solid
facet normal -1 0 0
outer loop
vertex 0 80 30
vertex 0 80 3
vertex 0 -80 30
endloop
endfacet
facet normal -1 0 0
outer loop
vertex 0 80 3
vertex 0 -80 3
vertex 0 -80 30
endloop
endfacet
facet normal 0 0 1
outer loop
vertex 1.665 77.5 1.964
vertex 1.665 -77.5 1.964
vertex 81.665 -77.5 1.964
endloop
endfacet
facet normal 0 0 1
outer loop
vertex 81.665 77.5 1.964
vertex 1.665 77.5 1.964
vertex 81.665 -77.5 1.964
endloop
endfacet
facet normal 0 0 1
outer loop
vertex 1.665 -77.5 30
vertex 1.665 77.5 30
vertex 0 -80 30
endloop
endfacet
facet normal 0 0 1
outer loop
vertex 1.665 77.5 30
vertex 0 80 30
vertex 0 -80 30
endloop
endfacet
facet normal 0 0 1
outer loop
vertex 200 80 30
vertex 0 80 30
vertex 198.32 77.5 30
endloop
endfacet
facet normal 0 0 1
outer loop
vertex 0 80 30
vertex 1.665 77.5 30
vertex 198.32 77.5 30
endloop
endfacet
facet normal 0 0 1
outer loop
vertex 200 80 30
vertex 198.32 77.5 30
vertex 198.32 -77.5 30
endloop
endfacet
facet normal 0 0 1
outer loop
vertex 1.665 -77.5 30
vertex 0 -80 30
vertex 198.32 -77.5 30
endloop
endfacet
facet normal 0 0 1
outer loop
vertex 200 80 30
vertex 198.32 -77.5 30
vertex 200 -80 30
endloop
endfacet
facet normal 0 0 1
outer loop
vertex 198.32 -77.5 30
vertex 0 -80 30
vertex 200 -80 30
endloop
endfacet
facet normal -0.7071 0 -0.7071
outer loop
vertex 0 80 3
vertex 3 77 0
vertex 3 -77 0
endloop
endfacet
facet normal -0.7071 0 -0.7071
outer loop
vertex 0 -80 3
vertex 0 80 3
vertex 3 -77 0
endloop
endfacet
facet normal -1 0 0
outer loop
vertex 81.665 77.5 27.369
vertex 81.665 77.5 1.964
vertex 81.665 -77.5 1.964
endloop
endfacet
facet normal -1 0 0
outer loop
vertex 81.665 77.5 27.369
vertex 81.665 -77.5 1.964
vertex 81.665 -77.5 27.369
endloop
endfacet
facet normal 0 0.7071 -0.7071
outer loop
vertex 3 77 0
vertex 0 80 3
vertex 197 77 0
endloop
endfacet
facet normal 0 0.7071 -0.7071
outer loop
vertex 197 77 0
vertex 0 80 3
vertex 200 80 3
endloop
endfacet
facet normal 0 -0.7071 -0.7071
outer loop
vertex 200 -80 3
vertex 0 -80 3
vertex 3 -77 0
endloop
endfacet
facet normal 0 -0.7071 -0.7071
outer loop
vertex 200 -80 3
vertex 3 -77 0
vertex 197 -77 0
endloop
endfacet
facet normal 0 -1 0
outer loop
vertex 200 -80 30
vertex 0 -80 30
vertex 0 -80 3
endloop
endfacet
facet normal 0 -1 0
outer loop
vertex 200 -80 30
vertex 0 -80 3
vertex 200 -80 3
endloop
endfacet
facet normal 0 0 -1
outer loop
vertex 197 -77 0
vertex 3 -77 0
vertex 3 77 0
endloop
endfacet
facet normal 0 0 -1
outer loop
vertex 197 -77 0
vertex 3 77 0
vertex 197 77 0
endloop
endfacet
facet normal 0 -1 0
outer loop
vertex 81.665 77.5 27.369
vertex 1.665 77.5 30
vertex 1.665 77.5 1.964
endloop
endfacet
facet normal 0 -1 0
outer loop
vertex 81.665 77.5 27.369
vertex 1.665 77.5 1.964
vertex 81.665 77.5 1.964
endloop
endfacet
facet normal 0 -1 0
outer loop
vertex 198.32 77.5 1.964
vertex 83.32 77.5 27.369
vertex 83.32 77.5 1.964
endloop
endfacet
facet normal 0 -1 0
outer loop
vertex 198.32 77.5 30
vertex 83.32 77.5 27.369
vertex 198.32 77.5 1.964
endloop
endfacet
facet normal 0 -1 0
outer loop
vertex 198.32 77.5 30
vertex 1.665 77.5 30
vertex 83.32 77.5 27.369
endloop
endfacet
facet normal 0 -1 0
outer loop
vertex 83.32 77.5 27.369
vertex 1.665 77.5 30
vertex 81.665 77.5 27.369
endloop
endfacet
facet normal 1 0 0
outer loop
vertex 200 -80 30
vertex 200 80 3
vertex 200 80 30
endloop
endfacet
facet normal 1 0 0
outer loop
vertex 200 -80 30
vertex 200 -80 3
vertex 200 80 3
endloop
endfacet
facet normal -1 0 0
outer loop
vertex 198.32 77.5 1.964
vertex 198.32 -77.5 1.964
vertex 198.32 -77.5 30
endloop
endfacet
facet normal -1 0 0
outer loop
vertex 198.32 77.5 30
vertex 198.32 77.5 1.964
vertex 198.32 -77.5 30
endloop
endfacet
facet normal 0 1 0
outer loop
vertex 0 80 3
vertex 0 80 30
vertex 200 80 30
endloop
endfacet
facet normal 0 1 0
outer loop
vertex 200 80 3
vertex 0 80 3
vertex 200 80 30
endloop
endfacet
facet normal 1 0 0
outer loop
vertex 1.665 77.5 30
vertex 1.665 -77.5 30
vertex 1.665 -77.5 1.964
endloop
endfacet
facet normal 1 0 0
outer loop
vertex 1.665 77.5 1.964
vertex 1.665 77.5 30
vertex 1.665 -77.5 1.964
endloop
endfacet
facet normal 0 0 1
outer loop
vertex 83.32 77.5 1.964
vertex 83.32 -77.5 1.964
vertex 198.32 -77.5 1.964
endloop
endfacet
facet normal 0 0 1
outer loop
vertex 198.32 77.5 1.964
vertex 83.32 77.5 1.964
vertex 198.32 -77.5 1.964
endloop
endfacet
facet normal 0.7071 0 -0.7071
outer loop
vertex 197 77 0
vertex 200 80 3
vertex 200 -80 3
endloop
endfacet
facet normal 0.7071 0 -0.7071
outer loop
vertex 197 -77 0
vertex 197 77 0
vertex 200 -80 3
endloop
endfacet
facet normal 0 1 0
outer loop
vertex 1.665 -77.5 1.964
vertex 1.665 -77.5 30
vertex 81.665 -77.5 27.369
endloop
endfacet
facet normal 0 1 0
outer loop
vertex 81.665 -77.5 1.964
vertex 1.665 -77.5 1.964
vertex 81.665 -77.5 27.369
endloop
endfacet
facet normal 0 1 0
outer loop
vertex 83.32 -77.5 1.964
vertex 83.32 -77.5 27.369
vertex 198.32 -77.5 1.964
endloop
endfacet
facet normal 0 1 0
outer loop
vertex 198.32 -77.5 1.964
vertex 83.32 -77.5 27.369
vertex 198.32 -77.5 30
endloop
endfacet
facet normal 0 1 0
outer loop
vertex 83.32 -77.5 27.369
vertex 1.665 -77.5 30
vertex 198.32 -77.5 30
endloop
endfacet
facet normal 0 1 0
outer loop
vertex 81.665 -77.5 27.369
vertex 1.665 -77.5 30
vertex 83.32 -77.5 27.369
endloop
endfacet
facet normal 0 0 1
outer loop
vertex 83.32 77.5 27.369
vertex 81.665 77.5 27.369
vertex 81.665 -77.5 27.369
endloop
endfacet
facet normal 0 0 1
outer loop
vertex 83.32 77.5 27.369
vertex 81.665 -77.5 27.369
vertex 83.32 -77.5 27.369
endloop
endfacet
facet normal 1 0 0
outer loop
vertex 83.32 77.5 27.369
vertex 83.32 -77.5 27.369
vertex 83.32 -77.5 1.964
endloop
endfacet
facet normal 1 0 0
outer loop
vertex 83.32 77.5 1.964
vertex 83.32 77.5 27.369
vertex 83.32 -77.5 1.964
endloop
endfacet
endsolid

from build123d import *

# Parameters (mm, degrees)
F0_W     = 200
F0_H     = 30
F1_DEPTH = 80
F2_W     = 0.6549034361
F2_H     = 3.5952763587
F2_W_2   = 1.654828703
F2_W_3   = 2.3097321391
F3_DEPTH = 77.5
F4_SIZE  = 3


with BuildPart() as f1:
    # F0 (on Front) → F1 (new body, symmetric)
    with BuildSketch(Plane.XZ):
        with Locations((100, 15)):
            Rectangle(F0_W, F0_H)
    extrude(amount=F1_DEPTH, both=True)

    # F2 (on Front) → F3 (cut, symmetric)
    with BuildSketch(Plane.XZ):
        Polygon((81.0098946095, 30.9638166718), (1.6647980455, 30.9638166718), (1.6647980455, 1.9638166718), (81.6647980455, 1.9638166718), (81.6647980455, 27.3685403131), (81.0098946095, 27.3685403131), align=None)
        with Locations((81.3373463275, 29.1661784924)):
            Rectangle(F2_W, F2_H)
        with Locations((82.492212397, 29.1661784924)):
            Rectangle(F2_W_2, F2_H)
        with Locations((84.4744928181, 29.1661784924)):
            Rectangle(F2_W_3, F2_H)
        Polygon((85.6293588877, 27.3685403131), (83.3196267486, 27.3685403131), (83.3196267486, 1.9638166718), (198.3196267486, 1.9638166718), (198.3196267486, 30.9638166718), (85.6293588877, 30.9638166718), align=None)
    extrude(amount=F3_DEPTH, both=True, mode=Mode.SUBTRACT)

    # F4
    f4_edges = [f1.edges().sort_by_distance(p)[0] for p in [
        (100, -80, 0),
        (0, 0, 0),
        (100, 80, 0),
        (200, 0, 0),
    ]]
    chamfer(f4_edges, length=F4_SIZE)


solid = f1.part
